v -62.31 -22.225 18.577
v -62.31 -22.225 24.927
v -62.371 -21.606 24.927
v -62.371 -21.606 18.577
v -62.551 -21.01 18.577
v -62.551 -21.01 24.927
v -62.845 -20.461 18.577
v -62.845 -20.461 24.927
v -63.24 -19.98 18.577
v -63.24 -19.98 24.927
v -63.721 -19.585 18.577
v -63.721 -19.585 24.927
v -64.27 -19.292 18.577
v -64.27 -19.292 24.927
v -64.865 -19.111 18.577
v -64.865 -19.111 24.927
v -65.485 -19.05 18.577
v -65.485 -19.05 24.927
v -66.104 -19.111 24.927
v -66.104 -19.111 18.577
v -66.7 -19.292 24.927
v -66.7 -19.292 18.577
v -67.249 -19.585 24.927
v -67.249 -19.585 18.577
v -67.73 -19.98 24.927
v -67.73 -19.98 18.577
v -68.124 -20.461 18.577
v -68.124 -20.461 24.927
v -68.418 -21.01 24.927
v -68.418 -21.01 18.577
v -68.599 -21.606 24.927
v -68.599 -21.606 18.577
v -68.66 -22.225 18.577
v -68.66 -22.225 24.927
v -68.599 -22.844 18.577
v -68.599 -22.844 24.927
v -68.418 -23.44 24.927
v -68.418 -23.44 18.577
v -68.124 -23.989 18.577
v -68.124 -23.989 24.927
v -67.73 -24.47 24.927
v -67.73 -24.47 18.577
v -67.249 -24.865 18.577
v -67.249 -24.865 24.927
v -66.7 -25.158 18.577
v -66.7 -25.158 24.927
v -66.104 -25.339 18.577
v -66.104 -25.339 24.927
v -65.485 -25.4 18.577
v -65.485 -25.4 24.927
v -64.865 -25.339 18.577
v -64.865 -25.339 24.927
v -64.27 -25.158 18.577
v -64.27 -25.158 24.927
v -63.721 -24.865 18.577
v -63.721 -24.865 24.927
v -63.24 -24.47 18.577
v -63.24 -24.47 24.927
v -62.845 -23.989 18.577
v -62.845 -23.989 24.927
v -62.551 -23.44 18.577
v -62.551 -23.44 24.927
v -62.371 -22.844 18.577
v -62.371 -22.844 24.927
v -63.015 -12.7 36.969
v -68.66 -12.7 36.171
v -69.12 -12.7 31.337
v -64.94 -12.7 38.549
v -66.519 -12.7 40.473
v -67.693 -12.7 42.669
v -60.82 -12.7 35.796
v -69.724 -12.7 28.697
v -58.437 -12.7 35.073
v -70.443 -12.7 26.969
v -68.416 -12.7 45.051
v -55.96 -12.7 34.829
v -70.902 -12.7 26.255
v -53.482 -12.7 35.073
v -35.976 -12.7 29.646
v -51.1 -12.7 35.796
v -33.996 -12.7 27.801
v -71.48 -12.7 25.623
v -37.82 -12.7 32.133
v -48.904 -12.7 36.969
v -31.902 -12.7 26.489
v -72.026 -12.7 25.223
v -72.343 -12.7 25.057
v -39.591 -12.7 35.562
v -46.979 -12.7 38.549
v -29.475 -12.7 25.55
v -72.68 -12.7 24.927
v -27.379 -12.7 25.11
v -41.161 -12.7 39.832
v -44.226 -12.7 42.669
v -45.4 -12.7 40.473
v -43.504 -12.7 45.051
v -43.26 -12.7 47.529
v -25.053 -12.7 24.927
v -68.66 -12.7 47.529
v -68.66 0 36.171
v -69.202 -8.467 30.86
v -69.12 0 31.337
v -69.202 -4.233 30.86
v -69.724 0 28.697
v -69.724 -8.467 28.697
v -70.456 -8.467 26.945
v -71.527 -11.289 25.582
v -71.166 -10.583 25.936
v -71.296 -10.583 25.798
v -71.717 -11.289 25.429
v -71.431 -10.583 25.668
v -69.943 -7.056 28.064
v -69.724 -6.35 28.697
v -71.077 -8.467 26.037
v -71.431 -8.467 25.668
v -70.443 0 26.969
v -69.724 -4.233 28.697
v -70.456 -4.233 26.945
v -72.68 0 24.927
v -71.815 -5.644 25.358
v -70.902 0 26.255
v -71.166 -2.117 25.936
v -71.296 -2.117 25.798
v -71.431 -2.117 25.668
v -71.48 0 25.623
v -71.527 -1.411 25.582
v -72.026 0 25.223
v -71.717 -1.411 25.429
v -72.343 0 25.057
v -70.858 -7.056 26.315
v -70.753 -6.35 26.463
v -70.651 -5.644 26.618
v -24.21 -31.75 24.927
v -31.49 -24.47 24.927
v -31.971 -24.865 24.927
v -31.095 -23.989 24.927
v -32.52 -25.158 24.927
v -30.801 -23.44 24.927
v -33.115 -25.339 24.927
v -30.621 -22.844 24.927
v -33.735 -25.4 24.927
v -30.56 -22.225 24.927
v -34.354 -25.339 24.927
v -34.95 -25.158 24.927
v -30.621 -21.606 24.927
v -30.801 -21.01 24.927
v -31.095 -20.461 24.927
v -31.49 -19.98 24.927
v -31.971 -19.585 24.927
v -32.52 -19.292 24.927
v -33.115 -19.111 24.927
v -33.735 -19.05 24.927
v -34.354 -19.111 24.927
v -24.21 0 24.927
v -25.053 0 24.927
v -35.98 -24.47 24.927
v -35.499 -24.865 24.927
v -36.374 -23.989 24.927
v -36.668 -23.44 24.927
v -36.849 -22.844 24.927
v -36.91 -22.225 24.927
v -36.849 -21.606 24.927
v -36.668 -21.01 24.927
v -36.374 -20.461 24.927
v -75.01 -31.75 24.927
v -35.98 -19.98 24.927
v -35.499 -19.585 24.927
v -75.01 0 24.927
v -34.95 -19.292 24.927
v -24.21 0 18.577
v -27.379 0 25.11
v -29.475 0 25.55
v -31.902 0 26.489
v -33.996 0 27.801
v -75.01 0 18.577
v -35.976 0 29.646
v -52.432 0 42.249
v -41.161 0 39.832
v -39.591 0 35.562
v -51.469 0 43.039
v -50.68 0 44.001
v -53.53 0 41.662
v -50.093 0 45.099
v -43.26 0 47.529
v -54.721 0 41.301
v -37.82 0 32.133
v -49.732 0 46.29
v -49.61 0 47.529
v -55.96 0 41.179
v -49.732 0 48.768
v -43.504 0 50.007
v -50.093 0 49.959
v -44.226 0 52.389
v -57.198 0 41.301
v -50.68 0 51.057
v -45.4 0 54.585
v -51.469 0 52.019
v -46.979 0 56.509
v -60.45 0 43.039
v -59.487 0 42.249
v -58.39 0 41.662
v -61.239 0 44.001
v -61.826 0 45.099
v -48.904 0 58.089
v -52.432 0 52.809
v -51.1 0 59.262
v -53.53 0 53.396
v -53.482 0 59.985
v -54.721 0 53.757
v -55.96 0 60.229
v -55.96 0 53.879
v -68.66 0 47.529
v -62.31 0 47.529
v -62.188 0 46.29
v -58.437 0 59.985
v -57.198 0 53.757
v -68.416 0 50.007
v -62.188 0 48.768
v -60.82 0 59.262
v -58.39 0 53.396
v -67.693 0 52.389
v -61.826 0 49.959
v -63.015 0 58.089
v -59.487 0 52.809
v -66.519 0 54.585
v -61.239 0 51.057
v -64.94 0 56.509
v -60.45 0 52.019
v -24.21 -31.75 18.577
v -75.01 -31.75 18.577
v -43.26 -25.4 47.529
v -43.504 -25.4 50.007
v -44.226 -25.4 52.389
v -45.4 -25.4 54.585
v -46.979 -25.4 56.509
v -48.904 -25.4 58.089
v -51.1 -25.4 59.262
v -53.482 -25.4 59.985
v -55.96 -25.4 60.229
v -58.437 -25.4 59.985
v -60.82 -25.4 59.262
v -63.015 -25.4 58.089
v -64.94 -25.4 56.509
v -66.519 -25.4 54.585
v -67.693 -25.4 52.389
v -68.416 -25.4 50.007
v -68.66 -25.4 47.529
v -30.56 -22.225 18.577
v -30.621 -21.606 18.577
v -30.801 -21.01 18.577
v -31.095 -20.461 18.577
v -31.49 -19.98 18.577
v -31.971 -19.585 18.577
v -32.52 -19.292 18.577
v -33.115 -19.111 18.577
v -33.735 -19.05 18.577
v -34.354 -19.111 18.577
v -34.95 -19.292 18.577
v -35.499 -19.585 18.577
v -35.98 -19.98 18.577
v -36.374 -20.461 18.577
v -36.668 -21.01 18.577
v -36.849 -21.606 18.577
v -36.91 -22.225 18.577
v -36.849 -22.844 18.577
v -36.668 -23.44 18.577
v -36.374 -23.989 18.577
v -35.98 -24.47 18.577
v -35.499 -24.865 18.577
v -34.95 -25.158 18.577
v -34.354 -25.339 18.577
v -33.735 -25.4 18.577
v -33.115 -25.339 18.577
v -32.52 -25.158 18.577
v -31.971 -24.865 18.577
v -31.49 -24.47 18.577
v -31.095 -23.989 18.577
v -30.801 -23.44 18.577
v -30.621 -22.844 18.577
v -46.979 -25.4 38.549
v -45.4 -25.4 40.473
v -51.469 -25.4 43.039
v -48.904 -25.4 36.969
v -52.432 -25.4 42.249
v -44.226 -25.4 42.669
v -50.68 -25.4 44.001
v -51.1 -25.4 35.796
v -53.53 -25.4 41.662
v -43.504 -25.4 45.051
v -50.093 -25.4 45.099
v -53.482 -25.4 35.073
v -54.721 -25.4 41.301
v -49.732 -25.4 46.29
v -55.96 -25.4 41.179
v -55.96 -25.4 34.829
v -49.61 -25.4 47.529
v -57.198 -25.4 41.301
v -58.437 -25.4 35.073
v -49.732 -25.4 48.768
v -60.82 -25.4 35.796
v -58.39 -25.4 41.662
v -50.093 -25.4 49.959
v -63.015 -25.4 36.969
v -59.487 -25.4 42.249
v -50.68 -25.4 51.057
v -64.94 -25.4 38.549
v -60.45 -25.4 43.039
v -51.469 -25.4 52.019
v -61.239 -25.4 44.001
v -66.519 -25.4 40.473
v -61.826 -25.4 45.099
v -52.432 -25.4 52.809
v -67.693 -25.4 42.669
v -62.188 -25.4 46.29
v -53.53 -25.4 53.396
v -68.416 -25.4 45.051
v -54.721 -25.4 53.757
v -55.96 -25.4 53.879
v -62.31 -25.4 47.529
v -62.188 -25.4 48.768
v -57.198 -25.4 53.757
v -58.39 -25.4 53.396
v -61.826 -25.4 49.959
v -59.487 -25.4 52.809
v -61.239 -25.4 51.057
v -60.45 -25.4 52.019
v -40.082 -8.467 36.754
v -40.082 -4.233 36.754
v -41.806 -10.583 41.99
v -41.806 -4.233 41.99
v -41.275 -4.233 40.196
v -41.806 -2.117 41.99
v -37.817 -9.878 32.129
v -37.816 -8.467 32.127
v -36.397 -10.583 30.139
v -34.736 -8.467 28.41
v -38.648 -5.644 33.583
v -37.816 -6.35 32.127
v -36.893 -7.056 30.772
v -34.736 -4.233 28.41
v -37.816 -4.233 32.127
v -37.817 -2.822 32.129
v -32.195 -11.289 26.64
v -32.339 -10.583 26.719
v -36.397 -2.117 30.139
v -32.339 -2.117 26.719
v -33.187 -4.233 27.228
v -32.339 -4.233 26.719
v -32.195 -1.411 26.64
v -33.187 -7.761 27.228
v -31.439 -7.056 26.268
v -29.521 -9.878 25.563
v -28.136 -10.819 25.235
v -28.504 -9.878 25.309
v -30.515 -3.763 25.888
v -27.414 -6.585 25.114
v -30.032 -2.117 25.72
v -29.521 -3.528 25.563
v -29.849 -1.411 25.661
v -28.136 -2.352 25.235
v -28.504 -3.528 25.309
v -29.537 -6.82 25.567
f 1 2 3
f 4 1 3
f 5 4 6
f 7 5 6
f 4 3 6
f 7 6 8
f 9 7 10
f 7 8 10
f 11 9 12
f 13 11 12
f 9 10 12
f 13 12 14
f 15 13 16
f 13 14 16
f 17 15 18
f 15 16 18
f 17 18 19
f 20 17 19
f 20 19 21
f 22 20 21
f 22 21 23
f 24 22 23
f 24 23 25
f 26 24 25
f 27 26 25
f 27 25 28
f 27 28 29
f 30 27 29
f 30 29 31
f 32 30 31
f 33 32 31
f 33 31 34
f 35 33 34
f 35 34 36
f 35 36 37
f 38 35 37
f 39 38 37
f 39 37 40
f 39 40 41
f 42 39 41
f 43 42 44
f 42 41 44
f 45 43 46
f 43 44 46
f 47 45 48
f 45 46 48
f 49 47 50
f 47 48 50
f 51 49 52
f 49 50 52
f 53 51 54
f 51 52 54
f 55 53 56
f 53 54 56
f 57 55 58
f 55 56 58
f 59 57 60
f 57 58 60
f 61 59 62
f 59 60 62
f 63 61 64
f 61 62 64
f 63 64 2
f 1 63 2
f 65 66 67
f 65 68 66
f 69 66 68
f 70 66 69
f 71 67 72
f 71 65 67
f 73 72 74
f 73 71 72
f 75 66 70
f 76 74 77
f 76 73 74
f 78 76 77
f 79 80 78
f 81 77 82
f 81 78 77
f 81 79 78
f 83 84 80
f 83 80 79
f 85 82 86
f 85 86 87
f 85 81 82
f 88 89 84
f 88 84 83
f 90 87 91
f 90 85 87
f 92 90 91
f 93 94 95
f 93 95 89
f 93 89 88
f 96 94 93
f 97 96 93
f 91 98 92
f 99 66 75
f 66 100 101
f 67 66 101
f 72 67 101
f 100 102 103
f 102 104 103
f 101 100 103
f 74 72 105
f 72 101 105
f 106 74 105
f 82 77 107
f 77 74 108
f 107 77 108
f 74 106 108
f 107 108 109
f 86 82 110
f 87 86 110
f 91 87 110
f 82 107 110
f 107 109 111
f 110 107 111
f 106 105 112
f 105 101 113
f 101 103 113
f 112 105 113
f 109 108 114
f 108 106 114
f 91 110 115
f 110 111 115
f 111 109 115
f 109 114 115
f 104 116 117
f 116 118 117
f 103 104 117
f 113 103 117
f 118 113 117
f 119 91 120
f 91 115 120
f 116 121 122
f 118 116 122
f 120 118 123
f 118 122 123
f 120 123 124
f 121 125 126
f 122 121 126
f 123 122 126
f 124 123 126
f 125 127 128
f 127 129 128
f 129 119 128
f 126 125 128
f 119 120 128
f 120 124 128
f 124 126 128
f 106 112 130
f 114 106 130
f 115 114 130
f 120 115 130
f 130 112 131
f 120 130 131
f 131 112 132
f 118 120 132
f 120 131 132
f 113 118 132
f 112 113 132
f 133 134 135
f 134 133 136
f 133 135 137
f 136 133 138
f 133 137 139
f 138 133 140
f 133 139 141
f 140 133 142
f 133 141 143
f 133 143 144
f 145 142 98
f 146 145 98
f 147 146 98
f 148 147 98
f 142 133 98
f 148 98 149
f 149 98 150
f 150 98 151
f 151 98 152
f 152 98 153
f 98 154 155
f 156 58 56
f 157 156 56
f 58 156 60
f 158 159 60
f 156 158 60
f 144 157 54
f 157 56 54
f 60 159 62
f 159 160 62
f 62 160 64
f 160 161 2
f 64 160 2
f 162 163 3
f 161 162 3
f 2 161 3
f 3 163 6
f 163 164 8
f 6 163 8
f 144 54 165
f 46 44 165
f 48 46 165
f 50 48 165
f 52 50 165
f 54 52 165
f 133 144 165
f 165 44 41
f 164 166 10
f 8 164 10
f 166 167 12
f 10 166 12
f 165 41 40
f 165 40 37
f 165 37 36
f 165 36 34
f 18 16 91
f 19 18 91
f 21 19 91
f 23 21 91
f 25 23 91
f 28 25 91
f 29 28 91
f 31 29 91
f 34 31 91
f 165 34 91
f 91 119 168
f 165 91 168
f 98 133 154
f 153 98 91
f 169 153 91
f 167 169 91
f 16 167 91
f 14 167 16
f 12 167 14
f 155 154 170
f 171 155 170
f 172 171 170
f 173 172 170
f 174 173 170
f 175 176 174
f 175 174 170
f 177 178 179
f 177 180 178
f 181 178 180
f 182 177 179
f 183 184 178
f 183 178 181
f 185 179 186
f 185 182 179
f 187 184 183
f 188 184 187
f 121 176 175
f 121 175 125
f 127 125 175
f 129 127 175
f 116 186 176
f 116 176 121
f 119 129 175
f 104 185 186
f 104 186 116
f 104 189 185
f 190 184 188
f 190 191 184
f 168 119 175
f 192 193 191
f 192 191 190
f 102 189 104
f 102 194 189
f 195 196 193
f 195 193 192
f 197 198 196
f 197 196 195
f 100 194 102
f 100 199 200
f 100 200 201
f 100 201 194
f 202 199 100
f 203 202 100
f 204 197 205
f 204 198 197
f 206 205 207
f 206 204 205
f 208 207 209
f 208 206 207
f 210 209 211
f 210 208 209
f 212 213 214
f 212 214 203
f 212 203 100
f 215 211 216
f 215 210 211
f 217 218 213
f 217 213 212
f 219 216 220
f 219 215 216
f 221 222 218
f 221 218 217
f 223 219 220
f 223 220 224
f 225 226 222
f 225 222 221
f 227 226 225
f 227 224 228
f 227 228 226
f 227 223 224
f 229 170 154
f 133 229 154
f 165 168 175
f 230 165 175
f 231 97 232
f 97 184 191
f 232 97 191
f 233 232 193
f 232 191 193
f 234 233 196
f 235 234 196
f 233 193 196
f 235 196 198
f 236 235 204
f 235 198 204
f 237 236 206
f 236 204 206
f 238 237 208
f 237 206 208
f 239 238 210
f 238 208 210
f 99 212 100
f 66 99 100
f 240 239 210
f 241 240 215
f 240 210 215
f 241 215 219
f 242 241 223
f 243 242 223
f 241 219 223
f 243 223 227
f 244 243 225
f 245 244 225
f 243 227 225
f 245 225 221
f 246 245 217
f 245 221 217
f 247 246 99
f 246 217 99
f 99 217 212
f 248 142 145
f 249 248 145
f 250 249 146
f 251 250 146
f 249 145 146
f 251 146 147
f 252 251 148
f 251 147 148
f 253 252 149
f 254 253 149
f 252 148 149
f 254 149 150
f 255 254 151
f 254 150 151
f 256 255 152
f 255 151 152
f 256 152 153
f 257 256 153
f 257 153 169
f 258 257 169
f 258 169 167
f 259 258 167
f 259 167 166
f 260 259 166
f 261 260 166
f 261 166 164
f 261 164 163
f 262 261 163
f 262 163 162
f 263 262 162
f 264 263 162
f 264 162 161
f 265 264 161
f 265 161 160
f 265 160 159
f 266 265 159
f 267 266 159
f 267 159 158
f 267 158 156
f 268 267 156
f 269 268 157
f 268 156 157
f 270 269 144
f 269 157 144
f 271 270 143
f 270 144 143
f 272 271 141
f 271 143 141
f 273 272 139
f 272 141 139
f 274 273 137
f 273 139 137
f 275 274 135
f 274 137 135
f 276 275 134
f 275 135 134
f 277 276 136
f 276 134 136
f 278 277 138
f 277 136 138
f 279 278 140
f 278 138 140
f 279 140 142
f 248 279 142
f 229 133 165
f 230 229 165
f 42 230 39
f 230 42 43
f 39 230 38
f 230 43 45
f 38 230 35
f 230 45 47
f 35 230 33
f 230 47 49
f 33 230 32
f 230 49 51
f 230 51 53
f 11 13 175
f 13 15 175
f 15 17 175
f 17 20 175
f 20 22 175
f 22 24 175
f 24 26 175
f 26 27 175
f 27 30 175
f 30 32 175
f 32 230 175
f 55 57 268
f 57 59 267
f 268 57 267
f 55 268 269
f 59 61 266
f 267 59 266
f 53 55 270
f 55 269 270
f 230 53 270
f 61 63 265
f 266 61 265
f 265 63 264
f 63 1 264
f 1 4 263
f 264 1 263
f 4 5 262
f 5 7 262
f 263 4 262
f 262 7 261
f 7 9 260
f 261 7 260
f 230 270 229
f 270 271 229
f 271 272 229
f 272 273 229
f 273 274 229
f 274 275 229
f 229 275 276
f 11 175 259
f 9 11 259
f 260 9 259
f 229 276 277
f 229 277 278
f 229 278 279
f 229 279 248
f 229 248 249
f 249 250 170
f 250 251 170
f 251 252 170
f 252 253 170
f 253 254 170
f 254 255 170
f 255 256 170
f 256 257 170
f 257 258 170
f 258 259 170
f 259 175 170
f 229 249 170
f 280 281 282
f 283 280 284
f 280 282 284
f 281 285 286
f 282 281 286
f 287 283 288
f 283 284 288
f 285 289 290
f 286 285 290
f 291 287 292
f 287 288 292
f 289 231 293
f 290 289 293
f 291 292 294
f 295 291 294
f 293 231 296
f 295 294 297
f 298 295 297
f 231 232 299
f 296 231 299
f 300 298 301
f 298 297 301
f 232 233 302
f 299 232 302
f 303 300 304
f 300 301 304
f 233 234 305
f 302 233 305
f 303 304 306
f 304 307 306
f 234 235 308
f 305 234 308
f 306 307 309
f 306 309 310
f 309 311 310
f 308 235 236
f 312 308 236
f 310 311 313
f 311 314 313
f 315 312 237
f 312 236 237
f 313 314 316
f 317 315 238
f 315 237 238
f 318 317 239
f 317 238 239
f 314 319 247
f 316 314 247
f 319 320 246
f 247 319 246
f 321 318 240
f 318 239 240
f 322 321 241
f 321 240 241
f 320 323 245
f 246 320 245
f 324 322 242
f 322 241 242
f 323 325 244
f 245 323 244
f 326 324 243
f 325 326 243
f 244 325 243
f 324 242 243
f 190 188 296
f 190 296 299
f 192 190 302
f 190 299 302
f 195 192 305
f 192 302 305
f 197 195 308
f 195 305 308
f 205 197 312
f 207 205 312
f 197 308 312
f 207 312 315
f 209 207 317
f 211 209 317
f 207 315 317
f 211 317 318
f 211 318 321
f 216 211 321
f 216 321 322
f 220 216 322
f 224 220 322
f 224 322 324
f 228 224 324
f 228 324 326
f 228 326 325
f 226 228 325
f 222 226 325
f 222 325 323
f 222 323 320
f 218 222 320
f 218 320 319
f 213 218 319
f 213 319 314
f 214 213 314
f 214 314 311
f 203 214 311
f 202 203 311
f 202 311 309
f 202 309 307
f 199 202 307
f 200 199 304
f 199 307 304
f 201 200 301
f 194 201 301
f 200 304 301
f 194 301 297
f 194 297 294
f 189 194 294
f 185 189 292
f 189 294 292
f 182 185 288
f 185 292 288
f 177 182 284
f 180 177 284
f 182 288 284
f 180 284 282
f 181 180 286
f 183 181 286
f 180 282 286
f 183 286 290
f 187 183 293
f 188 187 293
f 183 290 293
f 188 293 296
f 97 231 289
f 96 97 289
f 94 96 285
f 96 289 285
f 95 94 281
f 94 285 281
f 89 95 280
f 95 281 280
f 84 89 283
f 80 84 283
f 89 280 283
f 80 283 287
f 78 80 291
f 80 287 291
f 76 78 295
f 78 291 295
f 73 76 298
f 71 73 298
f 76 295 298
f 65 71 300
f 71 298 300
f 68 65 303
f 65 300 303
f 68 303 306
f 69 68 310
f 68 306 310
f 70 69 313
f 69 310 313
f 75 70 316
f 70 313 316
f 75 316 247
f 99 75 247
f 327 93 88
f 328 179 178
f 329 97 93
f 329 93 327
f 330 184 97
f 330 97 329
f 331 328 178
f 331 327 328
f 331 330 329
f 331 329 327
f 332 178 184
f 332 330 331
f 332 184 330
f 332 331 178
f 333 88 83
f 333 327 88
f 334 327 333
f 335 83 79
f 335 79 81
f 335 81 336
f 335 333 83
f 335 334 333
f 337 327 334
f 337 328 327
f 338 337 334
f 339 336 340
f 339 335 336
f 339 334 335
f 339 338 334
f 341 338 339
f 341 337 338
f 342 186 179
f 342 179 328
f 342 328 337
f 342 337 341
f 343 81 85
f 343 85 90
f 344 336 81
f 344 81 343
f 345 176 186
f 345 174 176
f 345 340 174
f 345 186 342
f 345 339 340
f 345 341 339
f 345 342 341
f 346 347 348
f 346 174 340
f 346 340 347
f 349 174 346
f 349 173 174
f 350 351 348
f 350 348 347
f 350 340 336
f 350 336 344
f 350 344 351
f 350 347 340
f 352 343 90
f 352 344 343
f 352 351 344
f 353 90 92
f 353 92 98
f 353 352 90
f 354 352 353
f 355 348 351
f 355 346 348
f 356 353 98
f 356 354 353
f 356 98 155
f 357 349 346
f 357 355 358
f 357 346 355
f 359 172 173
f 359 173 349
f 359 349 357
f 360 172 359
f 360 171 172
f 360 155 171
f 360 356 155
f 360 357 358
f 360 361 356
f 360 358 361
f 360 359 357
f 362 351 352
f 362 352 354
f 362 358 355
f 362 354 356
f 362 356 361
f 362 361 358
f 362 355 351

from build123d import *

# Parameters (mm, degrees)
F1_DEPTH = 25.4
F3_DEPTH = 6.35
F5_DEPTH = 19.05
F6_R     = 6.35
F7_DEPTH = 25.4010001
F8_R     = 3.175
F9_DEPTH = 6.3510001


with BuildPart() as f1:
    # F0 (on Front) → F1 (new body)
    with BuildSketch(Plane.XZ):
        with BuildLine():
            add(Edge.make_bspline(
                [(-43.2595827852, 47.5290406017), (-40.4437585235, 36.3493184584), (-37.6279342618, 25.1695963151), (-25.0532810608, 24.9273501791)],
                knots=[0, 0, 0, 0, 0.3387649469, 0.3387649469, 0.3387649469, 0.3387649469], degree=3))
            Line((-43.2595827852, 47.5290406017), (-43.2595827852, 24.9273501791))
            Line((-43.2595827852, 24.9273501791), (-25.0532810608, 24.9273501791))
        make_face()
        with BuildLine():
            Line((-24.2095827852, 24.9273501791), (-25.0532810608, 24.9273501791))
            add(Edge.make_bspline(
                [(-25.0532810608, 24.9273501791), (-24.776800624, 24.9220238837), (-24.495602442, 24.9219851311), (-24.2095827852, 24.9273501791)],
                knots=[0.3387649469, 0.3387649469, 0.3387649469, 0.3387649469, 0.3462134132, 0.3462134132, 0.3462134132, 0.3462134132], degree=3))
        make_face()
        with BuildLine():
            add(Edge.make_bspline(
                [(-72.6796290961, 24.9273501791), (-73.3463645358, 24.7120564737), (-74.1177900306, 24.7018207484), (-75.0095827852, 24.9273501791)],
                knots=[0.2357769442, 0.2357769442, 0.2357769442, 0.2357769442, 0.2710842466, 0.2710842466, 0.2710842466, 0.2710842466], degree=3))
            Line((-72.6796290961, 24.9273501791), (-75.0095827852, 24.9273501791))
        make_face()
        with BuildLine():
            Line((-68.6595827852, 24.9273501791), (-68.6595827852, 36.1707942024))
            add(Edge.make_bspline(
                [(-68.6595827852, 36.1707942024), (-68.9307748645, 30.329459196), (-69.8866500944, 25.8292233399), (-72.6796290961, 24.9273501791)],
                knots=[0.0878733709, 0.0878733709, 0.0878733709, 0.0878733709, 0.2357769442, 0.2357769442, 0.2357769442, 0.2357769442], degree=3))
            Line((-72.6796290961, 24.9273501791), (-68.6595827852, 24.9273501791))
        make_face()
        with BuildLine():
            ThreePointArc((-68.6490277589, 47.0113667108), (-68.6569437544, 47.2701498593), (-68.6595827852, 47.5290406017))
            Line((-68.6595827852, 47.5290406017), (-68.6595827852, 36.1707942024))
            add(Edge.make_bspline(
                [(-68.6490277589, 47.0113667108), (-68.5724341976, 43.2409261553), (-68.5055106798, 39.4894264591), (-68.6595827852, 36.1707942024)],
                knots=[0.0038450504, 0.0038450504, 0.0038450504, 0.0038450504, 0.0878733709, 0.0878733709, 0.0878733709, 0.0878733709], degree=3))
        make_face()
        with BuildLine():
            add(Edge.make_bspline(
                [(-68.6595827852, 47.5290406017), (-68.6560576938, 47.356469418), (-68.6525326024, 47.1838982344), (-68.6490277589, 47.0113667108)],
                knots=[0, 0, 0, 0, 0.0038450504, 0.0038450504, 0.0038450504, 0.0038450504], degree=3))
            ThreePointArc((-68.6595827852, 47.5290406017), (-68.6569437544, 47.2701498593), (-68.6490277589, 47.0113667108))
        make_face()
        with BuildLine():
            Line((-43.2595827852, 24.9273501791), (-43.2595827852, 47.5290406017))
            ThreePointArc((-43.2595827852, 47.5290406017), (-55.7006920428, 34.8316796324), (-68.6490277589, 47.0113667108))
            add(Edge.make_bspline(
                [(-68.6490277589, 47.0113667108), (-68.5724341976, 43.2409261553), (-68.5055106798, 39.4894264591), (-68.6595827852, 36.1707942024)],
                knots=[0.0038450504, 0.0038450504, 0.0038450504, 0.0038450504, 0.0878733709, 0.0878733709, 0.0878733709, 0.0878733709], degree=3))
            Line((-68.6595827852, 36.1707942024), (-68.6595827852, 24.9273501791))
            Line((-68.6595827852, 24.9273501791), (-72.6796290961, 24.9273501791))
            add(Edge.make_bspline(
                [(-72.6796290961, 24.9273501791), (-73.3463645358, 24.7120564737), (-74.1177900306, 24.7018207484), (-75.0095827852, 24.9273501791)],
                knots=[0.2357769442, 0.2357769442, 0.2357769442, 0.2357769442, 0.2710842466, 0.2710842466, 0.2710842466, 0.2710842466], degree=3))
            Line((-75.0095827852, 24.9273501791), (-75.0095827852, 18.5773501791))
            Line((-75.0095827852, 18.5773501791), (-24.2095827852, 18.5773501791))
            Line((-24.2095827852, 18.5773501791), (-24.2095827852, 24.9273501791))
            add(Edge.make_bspline(
                [(-25.0532810608, 24.9273501791), (-24.776800624, 24.9220238837), (-24.495602442, 24.9219851311), (-24.2095827852, 24.9273501791)],
                knots=[0.3387649469, 0.3387649469, 0.3387649469, 0.3387649469, 0.3462134132, 0.3462134132, 0.3462134132, 0.3462134132], degree=3))
            Line((-25.0532810608, 24.9273501791), (-43.2595827852, 24.9273501791))
        make_face()
        with BuildLine():
            ThreePointArc((-43.2595827852, 47.5290406017), (-46.9793266641, 56.5092967228), (-55.9595827852, 60.2290406017))
            ThreePointArc((-55.9595827852, 60.2290406017), (-64.9398389062, 56.5092967228), (-68.6595827852, 47.5290406017))
            add(Edge.make_bspline(
                [(-68.6595827852, 47.5290406017), (-68.6560576938, 47.356469418), (-68.6525326024, 47.1838982344), (-68.6490277589, 47.0113667108)],
                knots=[0, 0, 0, 0, 0.0038450504, 0.0038450504, 0.0038450504, 0.0038450504], degree=3))
            ThreePointArc((-68.6490277589, 47.0113667108), (-55.7006920428, 34.8316796324), (-43.2595827852, 47.5290406017))
        make_face()
    extrude(amount=F1_DEPTH)

    # F2 (on face) → F3 (join)
    with BuildSketch(Plane.XZ.offset(25.4)):
        with BuildLine():
            add(Edge.make_bspline(
                [(-43.2595827852, 47.5290406017), (-40.4437585235, 36.3493184584), (-37.6279342618, 25.1695963151), (-25.0532810608, 24.9273501791)],
                knots=[0, 0, 0, 0, 0.3387649469, 0.3387649469, 0.3387649469, 0.3387649469], degree=3))
            ThreePointArc((-43.2595827852, 47.5290406017), (-55.9595827852, 34.8290406017), (-68.6595827852, 47.5290406017))
            Line((-68.6595827852, 47.5290406017), (-68.6595827852, 36.1707942024))
            add(Edge.make_bspline(
                [(-68.6595827852, 36.1707942024), (-68.9307748645, 30.329459196), (-69.8866500944, 25.8292233399), (-72.6796290961, 24.9273501791)],
                knots=[0.0878733709, 0.0878733709, 0.0878733709, 0.0878733709, 0.2357769442, 0.2357769442, 0.2357769442, 0.2357769442], degree=3))
            Line((-72.6796290961, 24.9273501791), (-75.0095827852, 24.9273501791))
            Line((-75.0095827852, 24.9273501791), (-75.0095827852, 18.5773501791))
            Line((-75.0095827852, 18.5773501791), (-24.2095827852, 18.5773501791))
            Line((-24.2095827852, 18.5773501791), (-24.2095827852, 24.9273501791))
            Line((-24.2095827852, 24.9273501791), (-25.0532810608, 24.9273501791))
        make_face()
    extrude(amount=F3_DEPTH)

    # F4 (on face) → F5 (cut)
    with BuildSketch(Plane.XZ.offset(31.75)):
        with BuildLine():
            add(Edge.make_bspline(
                [(-68.6595827852, 36.1707942024), (-68.9307748645, 30.329459196), (-69.8866500944, 25.8292233399), (-72.6796290961, 24.9273501791)],
                knots=[0.0878733709, 0.0878733709, 0.0878733709, 0.0878733709, 0.2357769442, 0.2357769442, 0.2357769442, 0.2357769442], degree=3))
            Line((-72.6796290961, 24.9273501791), (-25.0532810608, 24.9273501791))
            add(Edge.make_bspline(
                [(-43.2595827852, 47.5290406017), (-40.4437585235, 36.3493184584), (-37.6279342618, 25.1695963151), (-25.0532810608, 24.9273501791)],
                knots=[0, 0, 0, 0, 0.3387649469, 0.3387649469, 0.3387649469, 0.3387649469], degree=3))
            ThreePointArc((-43.2595827852, 47.5290406017), (-55.9595827852, 34.8290406017), (-68.6595827852, 47.5290406017))
            Line((-68.6595827852, 47.5290406017), (-68.6595827852, 36.1707942024))
        make_face()
    extrude(amount=-F5_DEPTH, mode=Mode.SUBTRACT)

    # F6 (on face) → F7 (cut, through all)
    with BuildSketch(Plane.XZ.offset(25.4)):
        with Locations((-55.9595827852, 47.5290406017)):
            Circle(F6_R)
    extrude(amount=-F7_DEPTH, mode=Mode.SUBTRACT)

    # F8 (on face) → F9 (cut, through all)
    with BuildSketch(Plane.XY.offset(24.9273501791)):
        with Locations((-65.4845827852, -22.225)):
            Circle(F8_R)
        with Locations((-33.7345827852, -22.225)):
            Circle(F8_R)
    extrude(amount=-F9_DEPTH, mode=Mode.SUBTRACT)


solid = f1.part
